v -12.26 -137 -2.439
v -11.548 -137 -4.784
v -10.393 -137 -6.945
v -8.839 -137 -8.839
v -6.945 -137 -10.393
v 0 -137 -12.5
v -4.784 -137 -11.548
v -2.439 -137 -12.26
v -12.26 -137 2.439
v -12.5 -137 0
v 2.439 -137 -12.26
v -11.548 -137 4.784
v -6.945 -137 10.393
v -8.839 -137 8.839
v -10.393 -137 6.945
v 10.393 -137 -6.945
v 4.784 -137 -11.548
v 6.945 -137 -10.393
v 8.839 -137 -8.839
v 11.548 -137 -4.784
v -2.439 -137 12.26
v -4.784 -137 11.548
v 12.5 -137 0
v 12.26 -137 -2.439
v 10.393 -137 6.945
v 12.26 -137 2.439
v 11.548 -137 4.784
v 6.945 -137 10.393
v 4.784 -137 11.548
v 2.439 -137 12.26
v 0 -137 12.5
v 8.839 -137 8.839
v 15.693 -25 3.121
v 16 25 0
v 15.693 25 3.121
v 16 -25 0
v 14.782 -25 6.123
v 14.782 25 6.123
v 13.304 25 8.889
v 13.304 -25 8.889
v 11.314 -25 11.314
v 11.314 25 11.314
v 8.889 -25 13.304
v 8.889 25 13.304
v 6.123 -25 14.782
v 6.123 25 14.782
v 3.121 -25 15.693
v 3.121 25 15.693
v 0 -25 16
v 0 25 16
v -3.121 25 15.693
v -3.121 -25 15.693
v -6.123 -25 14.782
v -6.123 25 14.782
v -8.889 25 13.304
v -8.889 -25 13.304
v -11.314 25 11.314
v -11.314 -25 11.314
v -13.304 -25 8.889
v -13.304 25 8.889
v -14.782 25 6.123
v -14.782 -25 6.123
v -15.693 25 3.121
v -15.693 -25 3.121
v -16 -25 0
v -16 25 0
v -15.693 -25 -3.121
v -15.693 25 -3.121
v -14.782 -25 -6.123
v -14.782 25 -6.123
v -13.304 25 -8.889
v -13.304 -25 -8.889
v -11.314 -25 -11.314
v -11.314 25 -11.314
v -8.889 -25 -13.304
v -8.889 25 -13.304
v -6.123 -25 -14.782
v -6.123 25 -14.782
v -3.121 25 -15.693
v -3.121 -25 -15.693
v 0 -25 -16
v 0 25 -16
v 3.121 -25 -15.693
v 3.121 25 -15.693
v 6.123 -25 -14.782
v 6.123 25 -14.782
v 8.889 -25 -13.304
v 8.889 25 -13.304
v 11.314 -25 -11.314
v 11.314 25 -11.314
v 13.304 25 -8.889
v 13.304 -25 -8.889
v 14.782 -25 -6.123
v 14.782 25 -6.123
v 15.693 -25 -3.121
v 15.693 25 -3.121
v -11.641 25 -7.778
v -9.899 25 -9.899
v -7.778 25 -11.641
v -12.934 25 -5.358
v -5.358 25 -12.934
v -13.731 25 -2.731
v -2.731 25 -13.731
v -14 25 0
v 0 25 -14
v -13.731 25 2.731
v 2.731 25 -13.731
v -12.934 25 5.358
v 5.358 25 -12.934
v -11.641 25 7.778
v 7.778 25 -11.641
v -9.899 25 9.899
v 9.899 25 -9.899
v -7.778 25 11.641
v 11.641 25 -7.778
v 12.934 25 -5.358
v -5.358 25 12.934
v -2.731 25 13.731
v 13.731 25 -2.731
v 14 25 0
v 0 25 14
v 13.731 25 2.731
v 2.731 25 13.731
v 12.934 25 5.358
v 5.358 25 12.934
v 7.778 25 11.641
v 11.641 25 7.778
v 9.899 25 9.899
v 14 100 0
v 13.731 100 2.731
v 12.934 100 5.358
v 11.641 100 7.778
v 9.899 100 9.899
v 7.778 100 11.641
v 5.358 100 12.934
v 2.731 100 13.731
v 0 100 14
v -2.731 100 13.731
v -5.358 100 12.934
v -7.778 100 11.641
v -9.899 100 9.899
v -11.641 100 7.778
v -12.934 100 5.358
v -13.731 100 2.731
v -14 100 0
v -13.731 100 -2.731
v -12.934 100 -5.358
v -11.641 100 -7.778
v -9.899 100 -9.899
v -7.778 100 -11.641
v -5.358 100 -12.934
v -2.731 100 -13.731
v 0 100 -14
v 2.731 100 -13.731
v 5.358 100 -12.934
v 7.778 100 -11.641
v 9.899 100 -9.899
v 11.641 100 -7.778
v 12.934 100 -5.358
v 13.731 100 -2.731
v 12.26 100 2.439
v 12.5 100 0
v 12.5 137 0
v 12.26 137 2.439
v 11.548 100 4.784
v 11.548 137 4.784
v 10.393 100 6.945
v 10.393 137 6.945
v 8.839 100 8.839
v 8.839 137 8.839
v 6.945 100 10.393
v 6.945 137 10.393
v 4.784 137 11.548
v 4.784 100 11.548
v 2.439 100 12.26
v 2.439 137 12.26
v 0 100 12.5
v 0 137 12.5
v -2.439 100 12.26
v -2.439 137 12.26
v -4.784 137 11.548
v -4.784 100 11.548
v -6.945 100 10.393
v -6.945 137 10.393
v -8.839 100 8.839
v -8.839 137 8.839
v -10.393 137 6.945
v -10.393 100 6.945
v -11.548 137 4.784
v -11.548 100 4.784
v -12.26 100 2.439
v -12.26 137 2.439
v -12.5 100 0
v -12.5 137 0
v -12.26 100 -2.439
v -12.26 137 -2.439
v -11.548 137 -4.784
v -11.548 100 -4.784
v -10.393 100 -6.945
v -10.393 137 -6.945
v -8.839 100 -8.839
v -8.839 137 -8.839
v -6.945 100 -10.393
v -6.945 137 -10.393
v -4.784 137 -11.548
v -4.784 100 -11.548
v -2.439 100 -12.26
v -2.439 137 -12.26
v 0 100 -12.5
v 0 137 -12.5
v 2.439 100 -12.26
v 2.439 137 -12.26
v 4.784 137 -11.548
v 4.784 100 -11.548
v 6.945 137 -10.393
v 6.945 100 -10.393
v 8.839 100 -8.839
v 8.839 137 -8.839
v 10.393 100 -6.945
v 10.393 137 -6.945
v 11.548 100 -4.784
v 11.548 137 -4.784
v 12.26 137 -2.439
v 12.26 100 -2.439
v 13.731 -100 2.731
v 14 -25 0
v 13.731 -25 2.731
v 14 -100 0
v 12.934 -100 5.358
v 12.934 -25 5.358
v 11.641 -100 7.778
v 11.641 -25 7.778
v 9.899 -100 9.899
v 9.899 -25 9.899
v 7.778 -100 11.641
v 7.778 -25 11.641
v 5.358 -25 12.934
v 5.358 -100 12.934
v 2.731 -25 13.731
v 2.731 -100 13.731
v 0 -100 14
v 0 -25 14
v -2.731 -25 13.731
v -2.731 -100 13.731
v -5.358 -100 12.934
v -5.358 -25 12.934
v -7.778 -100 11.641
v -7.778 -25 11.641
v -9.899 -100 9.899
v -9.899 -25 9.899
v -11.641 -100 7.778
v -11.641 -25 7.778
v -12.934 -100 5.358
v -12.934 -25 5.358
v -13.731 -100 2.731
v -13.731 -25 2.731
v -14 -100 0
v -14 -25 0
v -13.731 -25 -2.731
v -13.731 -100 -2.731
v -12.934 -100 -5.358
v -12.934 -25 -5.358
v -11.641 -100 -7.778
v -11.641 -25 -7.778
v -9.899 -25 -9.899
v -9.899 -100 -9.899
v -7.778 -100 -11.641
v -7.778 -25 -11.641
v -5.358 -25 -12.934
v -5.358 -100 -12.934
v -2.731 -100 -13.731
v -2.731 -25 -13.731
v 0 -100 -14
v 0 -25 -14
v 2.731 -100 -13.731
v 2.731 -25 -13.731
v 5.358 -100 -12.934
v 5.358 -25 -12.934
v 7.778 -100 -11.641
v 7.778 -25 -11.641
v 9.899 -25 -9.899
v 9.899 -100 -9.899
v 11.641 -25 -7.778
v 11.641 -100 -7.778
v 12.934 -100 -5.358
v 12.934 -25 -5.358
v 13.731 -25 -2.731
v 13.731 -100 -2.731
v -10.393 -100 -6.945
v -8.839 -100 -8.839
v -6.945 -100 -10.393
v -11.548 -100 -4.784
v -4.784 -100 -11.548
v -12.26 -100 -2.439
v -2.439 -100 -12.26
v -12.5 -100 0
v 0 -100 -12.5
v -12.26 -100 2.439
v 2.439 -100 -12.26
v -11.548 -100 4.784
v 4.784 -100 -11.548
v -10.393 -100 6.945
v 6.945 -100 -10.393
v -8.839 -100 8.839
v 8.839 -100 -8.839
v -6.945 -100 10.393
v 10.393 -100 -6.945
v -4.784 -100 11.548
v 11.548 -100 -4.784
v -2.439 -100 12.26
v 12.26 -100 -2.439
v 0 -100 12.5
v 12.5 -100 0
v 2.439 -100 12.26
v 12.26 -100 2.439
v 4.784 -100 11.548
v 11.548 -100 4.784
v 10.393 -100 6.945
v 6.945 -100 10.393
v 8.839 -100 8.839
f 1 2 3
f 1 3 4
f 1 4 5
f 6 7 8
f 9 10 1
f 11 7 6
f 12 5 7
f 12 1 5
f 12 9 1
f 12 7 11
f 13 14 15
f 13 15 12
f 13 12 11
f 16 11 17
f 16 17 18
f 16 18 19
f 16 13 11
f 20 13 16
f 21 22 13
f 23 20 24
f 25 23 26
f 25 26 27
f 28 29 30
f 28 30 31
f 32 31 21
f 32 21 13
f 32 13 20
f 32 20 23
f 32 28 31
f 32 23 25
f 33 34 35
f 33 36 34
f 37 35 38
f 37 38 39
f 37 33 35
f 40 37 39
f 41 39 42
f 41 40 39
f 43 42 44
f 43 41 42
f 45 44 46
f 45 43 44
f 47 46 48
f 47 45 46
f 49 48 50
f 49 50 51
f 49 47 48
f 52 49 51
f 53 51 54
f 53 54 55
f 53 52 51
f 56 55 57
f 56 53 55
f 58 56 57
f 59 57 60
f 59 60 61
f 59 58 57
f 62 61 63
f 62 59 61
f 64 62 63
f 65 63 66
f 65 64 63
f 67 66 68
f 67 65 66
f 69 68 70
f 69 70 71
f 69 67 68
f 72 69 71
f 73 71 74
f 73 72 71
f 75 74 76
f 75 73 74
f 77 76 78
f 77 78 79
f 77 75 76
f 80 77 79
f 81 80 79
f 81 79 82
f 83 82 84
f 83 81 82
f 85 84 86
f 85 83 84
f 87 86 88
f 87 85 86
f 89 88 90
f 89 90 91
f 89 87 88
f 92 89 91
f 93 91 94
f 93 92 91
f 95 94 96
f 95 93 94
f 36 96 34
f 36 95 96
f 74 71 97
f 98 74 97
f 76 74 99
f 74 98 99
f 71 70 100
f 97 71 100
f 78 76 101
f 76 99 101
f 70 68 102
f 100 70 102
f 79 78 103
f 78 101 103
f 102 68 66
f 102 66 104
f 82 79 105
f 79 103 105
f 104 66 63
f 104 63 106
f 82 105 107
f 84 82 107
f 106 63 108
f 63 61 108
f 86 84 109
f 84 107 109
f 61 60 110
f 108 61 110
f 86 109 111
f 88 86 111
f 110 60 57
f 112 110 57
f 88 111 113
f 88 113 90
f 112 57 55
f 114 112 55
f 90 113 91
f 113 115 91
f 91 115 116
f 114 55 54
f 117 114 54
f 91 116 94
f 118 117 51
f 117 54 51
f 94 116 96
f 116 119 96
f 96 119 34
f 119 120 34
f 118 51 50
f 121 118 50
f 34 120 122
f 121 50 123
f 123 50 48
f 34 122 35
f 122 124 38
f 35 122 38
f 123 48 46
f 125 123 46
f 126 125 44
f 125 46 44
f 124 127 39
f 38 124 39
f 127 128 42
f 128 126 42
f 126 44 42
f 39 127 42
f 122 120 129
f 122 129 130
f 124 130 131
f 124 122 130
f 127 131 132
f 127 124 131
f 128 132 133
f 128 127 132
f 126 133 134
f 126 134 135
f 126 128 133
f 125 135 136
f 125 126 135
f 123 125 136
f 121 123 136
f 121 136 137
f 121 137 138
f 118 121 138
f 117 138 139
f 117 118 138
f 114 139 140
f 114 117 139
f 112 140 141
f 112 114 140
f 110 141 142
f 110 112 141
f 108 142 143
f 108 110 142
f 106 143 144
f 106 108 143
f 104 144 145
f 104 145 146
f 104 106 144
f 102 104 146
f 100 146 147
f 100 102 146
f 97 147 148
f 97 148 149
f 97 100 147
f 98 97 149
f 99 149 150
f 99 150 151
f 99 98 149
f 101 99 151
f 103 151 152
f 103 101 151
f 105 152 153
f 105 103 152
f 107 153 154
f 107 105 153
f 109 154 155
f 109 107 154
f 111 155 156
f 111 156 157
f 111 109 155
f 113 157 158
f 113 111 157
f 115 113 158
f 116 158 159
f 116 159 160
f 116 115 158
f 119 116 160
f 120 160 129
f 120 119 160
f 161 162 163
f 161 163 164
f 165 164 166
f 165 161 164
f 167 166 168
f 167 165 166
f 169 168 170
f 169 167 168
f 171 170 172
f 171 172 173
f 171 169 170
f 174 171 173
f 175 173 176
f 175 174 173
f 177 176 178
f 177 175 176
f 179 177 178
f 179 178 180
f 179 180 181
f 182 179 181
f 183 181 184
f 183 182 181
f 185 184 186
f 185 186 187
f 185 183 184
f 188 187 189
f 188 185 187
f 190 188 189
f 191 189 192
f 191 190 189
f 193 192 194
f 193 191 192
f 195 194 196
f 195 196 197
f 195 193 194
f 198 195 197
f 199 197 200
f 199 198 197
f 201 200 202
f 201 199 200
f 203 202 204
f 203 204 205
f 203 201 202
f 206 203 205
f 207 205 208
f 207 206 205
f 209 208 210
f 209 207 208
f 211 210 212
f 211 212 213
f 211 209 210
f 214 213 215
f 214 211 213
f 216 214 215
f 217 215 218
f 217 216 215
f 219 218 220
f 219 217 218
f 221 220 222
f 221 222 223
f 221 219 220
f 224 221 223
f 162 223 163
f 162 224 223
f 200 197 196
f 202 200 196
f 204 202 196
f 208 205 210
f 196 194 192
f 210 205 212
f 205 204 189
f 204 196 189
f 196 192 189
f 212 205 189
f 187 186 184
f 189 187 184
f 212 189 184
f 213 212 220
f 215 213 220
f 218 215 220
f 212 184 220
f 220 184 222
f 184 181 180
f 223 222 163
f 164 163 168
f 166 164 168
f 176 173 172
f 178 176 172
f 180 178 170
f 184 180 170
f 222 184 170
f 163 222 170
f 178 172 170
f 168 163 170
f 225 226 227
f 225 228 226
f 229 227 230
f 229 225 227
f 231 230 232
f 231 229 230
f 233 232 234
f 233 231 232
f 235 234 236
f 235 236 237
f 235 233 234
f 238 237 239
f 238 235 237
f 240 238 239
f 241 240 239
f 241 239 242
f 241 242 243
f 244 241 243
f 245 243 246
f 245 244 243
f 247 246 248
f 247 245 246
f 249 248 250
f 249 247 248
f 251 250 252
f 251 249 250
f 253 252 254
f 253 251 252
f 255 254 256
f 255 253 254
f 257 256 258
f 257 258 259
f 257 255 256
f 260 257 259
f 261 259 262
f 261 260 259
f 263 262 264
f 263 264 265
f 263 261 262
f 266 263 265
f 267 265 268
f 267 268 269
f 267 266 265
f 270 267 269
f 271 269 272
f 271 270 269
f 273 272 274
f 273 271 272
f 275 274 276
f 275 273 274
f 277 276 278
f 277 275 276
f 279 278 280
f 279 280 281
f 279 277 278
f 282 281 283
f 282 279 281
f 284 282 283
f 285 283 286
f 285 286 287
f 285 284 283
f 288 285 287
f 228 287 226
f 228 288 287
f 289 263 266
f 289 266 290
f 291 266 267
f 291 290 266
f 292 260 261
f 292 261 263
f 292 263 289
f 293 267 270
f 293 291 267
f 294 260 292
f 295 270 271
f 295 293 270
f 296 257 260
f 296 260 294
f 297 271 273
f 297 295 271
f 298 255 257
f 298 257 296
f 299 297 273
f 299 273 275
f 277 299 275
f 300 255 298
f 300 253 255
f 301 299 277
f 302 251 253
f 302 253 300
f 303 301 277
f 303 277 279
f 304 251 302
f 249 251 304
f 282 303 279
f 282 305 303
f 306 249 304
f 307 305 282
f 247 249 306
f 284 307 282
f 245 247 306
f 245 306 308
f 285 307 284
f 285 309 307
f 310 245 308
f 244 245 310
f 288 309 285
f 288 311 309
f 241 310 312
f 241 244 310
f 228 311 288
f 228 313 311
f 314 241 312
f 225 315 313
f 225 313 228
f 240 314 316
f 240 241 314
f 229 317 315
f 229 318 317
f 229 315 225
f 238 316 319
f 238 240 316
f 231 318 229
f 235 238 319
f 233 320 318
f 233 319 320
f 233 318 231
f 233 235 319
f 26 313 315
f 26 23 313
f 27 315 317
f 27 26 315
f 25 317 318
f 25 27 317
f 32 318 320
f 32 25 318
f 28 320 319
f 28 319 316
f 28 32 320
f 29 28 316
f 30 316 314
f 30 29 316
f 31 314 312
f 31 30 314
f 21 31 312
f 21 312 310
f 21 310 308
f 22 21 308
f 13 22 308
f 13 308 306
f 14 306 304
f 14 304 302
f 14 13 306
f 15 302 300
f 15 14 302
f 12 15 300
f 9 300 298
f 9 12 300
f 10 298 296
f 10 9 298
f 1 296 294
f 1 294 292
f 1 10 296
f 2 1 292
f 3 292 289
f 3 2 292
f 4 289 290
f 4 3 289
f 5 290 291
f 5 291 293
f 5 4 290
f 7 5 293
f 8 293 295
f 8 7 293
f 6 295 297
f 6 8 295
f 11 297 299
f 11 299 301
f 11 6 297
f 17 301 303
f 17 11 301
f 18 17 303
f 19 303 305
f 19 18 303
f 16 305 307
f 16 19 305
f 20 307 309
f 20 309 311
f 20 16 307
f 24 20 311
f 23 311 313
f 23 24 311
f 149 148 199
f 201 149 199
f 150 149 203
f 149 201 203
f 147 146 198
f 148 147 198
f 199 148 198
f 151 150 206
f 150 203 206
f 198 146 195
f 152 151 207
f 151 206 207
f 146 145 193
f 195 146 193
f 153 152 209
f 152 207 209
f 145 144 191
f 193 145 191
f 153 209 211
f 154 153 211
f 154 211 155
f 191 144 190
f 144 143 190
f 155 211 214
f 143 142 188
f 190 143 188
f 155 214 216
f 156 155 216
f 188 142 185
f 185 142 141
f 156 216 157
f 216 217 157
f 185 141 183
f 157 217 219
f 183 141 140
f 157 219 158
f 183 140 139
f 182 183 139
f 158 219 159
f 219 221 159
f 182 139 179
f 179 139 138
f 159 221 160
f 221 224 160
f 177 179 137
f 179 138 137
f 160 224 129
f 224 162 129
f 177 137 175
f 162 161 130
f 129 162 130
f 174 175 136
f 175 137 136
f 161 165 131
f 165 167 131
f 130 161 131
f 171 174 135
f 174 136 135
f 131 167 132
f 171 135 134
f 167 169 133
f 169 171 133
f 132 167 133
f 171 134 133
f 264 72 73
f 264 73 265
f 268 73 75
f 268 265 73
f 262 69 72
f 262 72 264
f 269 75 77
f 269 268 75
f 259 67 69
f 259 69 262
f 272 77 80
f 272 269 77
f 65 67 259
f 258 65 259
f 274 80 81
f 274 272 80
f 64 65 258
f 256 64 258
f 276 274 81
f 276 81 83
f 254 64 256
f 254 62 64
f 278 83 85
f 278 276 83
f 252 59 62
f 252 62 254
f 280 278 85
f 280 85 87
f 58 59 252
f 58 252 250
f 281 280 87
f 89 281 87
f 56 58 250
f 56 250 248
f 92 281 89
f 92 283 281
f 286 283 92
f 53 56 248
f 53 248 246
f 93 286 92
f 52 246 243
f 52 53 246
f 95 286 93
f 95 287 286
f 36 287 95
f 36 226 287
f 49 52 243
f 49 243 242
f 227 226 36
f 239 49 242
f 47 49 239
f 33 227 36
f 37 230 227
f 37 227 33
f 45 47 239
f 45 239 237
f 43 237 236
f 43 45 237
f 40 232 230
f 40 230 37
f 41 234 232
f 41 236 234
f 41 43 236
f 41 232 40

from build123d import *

# Parameters (mm, degrees)
F0_R     = 12.5
F1_DEPTH = 137
F0_R_2   = 14
F2_DEPTH = 100
F0_R_3   = 16
F3_DEPTH = 25


with BuildPart() as f1:
    # F0 (on Front) → F1 (new body, symmetric)
    with BuildSketch(Plane.XZ):
        Circle(F0_R)
    extrude(amount=F1_DEPTH, both=True)

    # F0 (on Front) → F2 (join, symmetric)
    with BuildSketch(Plane.XZ):
        Circle(F0_R_2)
        Circle(F0_R, mode=Mode.SUBTRACT)
    extrude(amount=F2_DEPTH, both=True)

    # F0 (on Front) → F3 (join, symmetric)
    with BuildSketch(Plane.XZ):
        Circle(F0_R_3)
        Circle(F0_R_2, mode=Mode.SUBTRACT)
    extrude(amount=F3_DEPTH, both=True)


solid = f1.part
